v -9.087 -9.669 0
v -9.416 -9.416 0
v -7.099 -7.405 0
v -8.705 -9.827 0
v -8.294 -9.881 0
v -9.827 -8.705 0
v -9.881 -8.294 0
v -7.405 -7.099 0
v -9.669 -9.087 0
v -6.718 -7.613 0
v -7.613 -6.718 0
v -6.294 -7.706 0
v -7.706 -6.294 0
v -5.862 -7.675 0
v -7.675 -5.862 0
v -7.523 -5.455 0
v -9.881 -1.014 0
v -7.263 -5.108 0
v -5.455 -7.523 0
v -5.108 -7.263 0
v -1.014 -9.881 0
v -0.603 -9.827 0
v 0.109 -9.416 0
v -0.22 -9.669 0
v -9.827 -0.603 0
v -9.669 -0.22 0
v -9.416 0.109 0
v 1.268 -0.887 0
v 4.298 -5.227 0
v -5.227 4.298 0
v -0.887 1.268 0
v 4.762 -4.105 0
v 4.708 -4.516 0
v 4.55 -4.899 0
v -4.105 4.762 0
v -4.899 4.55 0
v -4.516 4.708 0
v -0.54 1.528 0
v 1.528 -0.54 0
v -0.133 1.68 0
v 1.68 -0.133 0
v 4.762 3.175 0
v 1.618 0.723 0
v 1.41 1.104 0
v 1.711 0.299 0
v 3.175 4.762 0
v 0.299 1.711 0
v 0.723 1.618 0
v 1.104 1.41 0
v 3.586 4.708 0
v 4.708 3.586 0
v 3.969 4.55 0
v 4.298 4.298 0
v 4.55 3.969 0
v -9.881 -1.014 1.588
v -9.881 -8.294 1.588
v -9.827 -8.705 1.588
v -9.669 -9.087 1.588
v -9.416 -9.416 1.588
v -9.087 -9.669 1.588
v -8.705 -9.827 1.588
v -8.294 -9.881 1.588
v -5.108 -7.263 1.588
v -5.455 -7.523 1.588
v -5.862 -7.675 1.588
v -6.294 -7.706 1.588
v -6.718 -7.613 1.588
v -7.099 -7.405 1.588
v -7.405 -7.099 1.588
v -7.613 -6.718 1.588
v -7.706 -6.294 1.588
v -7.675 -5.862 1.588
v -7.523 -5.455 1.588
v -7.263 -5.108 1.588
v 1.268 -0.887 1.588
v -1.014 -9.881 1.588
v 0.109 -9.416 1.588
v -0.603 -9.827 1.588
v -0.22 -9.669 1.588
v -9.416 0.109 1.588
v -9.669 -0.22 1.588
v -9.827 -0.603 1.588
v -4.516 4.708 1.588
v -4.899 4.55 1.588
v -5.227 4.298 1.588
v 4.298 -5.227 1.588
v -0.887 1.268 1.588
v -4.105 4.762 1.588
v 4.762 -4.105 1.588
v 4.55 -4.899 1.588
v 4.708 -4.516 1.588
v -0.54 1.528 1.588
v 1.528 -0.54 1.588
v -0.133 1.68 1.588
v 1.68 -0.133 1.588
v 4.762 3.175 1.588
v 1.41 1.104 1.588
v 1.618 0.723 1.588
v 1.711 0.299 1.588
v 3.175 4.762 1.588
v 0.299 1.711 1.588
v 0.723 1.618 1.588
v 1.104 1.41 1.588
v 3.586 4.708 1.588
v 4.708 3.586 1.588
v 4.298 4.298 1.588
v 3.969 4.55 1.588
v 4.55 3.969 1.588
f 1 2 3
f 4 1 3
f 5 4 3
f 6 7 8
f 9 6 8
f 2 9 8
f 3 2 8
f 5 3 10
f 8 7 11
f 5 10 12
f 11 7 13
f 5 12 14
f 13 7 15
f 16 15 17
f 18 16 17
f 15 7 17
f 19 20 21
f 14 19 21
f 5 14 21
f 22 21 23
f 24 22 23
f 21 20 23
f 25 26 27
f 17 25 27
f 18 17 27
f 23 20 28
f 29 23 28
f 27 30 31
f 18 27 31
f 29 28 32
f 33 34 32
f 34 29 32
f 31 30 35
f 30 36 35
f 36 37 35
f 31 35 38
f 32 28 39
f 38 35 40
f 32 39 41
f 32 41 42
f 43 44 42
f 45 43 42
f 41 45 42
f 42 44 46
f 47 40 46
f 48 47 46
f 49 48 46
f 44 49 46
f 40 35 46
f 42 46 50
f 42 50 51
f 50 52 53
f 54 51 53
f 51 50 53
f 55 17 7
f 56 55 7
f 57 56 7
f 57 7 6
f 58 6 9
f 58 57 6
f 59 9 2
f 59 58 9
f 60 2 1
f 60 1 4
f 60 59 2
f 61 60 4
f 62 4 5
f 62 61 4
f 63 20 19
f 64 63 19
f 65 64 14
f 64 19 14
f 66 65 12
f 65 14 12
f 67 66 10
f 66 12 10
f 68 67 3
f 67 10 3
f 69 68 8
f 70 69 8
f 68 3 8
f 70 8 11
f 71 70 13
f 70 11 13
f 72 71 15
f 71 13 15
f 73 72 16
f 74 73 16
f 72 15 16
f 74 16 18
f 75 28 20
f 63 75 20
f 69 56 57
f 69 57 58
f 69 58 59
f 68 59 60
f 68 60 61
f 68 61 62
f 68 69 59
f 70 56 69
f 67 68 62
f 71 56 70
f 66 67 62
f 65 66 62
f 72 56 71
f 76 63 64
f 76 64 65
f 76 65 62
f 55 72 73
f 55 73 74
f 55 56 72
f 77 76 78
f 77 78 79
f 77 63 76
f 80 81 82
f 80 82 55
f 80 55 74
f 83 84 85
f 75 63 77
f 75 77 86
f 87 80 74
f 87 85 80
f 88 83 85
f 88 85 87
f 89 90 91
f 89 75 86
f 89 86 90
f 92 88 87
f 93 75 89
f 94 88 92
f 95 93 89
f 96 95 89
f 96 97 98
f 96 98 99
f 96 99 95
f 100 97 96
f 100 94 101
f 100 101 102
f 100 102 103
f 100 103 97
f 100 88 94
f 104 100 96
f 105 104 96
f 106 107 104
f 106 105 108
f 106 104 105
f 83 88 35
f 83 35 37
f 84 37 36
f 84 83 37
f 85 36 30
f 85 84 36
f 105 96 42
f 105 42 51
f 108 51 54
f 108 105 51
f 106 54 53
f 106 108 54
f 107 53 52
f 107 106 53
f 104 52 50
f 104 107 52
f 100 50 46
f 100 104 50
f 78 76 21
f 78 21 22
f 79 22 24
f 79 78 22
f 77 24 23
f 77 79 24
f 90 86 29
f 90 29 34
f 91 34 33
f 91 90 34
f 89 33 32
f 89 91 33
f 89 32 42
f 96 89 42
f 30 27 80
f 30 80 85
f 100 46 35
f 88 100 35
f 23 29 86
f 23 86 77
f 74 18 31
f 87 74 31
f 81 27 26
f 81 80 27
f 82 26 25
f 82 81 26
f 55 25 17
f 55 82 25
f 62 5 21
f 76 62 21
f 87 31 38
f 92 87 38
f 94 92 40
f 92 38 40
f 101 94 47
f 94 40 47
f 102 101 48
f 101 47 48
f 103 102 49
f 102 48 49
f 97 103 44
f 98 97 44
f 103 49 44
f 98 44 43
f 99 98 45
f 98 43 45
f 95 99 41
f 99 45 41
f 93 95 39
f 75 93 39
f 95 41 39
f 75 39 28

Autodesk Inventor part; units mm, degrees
ref_plane "YZ Plane" through (0, 0, 0) normal (1, 0, 0) x (0, 1, 0)
ref_plane "XZ Plane" through (0, 0, 0) normal (0, 1, 0) x (-1, 0, 0)
ref_plane "XY Plane" through (0, 0, 0) normal (0, 0, 1) x (1, 0, 0)
sketch "Sketch2" plane through (0, 0, 0) normal (0, 0, 1) x (1, 0, 0)
  line L0 (-4.7625, -4.7625) -> (4.7625, -4.7625)
  line L1 (4.7625, -4.7625) -> (4.7625, 4.7625)
  line L2 (4.7625, 4.7625) -> (-4.7625, 4.7625)
  line L3 (-4.7625, 4.7625) -> (-4.7625, -4.7625)
  line L4 (-4.7625, -4.7625) -> (4.7625, 4.7625) construction
  line L5 (4.7625, -4.7625) -> (-4.7625, 4.7625) construction
  line L6 (-4.7625, 4.7625) -> (4.7625, -4.7625)
  line L7 (4.7625, -4.7625) -> (-0.3562, -9.8812)
  line L8 (-0.3562, -9.8812) -> (-9.8812, -0.3562)
  line L9 (-9.8812, -0.3562) -> (-4.7625, 4.7625)
  line L10 (-9.8812, -0.3562) -> (-9.8812, -9.8812)
  line L11 (-9.8812, -9.8812) -> (-0.3562, -9.8812)
  line L12 (-0.3562, -9.8812) -> (-0.3562, -0.3562)
  line L13 (-0.3562, -0.3562) -> (-9.8812, -0.3562)
  line L14 (-9.8812, -0.3562) -> (-0.3562, -9.8812) construction
  line L15 (-9.8812, -9.8812) -> (-0.3562, -0.3562) construction
  point P0 (0, 0)
  point P1 (-5.1187, -5.1187)
  point P2 (-5.1187, -5.1187)
  dimension "clip_edge" = 9.525
  dimension "d1" = 9.525
  dimension "d2" = 7.239
  dimension "d39" = 9.525
  dimension "d40" = 9.525
extrude "Extrusion1" add sketch "Sketch2" along normal blind 1.5875
sketch "Sketch3" plane through (0, 0, 0) normal (0, 0, -1) x (-1, 0, 0)
  line L0 (6.1855, -6.1855) -> (-0.1905, 0.1905)
  line L1 (0.3562, -9.8812) -> (-4.7625, -4.7625) construction
  line L2 (-4.7625, 4.7625) -> (5.1187, -5.1187) construction
  line L3 (9.8812, -0.3562) -> (0.3562, -9.8812) construction
  line L4 (-4.7625, 4.7625) -> (4.7625, 4.7625) projected
  line L5 (6.1855, -6.1855) -> (-0.1905, 0.1905) construction
  line L6 (7.2631, -5.1079) -> (0.8871, 1.2681)
  line L7 (-1.2681, -0.8871) -> (5.1079, -7.2631)
  arc A0 (5.1079, -7.2631) -> (7.2631, -5.1079) centre (6.1855, -6.1855) ccw
  arc A1 (0.8871, 1.2681) -> (-1.2681, -0.8871) centre (-0.1905, 0.1905) ccw
  point P0 (0, 0)
  point P1 (2.9975, -2.9975)
  dimension "d5" = 9.017
  dimension "d6" = 4.572
  dimension "d31" = 3.048
extrude "Extrusion7" cut sketch "Sketch3" against normal through all
fillet "Fillet13" radius 1.5875 6 edges at (-4.7625, 4.7625, 0.7937) (-9.8812, -0.3562, 0.7937) (-9.8812, -9.8812, 0.7937) (4.7625, -4.7625, 0.7937) (4.7625, 4.7625, 0.7937) (-0.3562, -9.8812, 0.7937)
equation "\"d1\" = clip_edge"
properties part number "hph_D_001"
